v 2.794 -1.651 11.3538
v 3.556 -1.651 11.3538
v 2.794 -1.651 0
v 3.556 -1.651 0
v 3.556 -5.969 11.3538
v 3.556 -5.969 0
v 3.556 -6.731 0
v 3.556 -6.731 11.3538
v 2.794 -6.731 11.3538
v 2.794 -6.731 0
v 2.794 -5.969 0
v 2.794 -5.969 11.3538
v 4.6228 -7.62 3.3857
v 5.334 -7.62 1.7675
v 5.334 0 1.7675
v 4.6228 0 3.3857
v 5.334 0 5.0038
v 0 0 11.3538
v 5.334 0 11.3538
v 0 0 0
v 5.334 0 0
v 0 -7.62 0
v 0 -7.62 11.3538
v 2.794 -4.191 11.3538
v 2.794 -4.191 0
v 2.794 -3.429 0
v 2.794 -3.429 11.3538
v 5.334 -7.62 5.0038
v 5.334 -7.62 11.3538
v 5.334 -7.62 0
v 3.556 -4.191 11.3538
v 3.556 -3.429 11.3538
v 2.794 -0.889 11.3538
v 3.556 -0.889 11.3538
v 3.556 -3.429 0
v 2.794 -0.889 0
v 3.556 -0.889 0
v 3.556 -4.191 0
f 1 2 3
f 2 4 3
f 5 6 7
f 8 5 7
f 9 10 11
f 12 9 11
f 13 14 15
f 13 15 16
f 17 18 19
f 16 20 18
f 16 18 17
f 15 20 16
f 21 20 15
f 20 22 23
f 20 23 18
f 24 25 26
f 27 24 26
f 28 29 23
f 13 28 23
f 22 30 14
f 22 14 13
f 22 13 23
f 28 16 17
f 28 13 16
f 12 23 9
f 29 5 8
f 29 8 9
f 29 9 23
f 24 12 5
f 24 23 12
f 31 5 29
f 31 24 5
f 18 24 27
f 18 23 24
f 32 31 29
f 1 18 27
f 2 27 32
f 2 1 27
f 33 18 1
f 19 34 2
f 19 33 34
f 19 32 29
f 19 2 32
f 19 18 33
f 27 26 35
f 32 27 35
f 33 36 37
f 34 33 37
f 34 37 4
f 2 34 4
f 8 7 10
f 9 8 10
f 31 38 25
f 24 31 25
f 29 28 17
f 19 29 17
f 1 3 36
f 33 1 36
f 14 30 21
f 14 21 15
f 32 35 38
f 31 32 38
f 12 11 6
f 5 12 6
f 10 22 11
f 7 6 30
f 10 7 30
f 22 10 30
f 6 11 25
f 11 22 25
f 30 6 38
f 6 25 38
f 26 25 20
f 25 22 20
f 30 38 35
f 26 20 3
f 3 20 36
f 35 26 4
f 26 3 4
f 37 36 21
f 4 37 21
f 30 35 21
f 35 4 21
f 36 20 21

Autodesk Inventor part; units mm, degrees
ref_plane "YZ Plane" through (0, 0, 0) normal (1, 0, 0) x (0, 1, 0)
ref_plane "XZ Plane" through (0, 0, 0) normal (0, 1, 0) x (-1, 0, 0)
ref_plane "XY Plane" through (0, 0, 0) normal (0, 0, 1) x (1, 0, 0)
sketch "Sketch1" plane through (0, 0, 0) normal (0, 0, 1) x (1, 0, 0)
  line L0 (2.794, -4.191) -> (2.794, -3.429)
  line L1 (2.794, -3.429) -> (3.556, -3.429)
  line L2 (3.556, -3.429) -> (3.556, -4.191)
  line L3 (3.556, -4.191) -> (2.794, -4.191)
  line L4 (2.794, -6.731) -> (2.794, -5.969)
  line L5 (2.794, -5.969) -> (3.556, -5.969)
  line L6 (3.556, -5.969) -> (3.556, -6.731)
  line L7 (3.556, -6.731) -> (2.794, -6.731)
  line L8 (2.794, -1.651) -> (2.794, -0.889)
  line L9 (2.794, -0.889) -> (3.556, -0.889)
  line L10 (3.556, -0.889) -> (3.556, -1.651)
  line L11 (3.556, -1.651) -> (2.794, -1.651)
  line L12 (5.334, 0) -> (5.334, -7.62)
  line L13 (5.334, 0) -> (0, 0)
  line L14 (0, 0) -> (0, -7.62)
  line L15 (0, -7.62) -> (5.334, -7.62)
  line L16 (5.334, -7.62) -> (6.35, -7.62)
  line L17 (6.35, 0) -> (6.35, -7.62)
  line L18 (6.35, 0) -> (5.334, 0)
  line L19 (-0.611, -8.231) -> (-0.611, 0.611)
  line L20 (-0.611, 0.611) -> (5.334, 0.611)
  line L21 (5.334, 0.611) -> (6.961, 0.611)
  line L22 (6.961, 0.611) -> (6.961, -8.231)
  line L23 (6.961, -8.231) -> (5.334, -8.231)
  line L24 (5.334, -8.231) -> (-0.611, -8.231)
  point P0 (-0.635, 26.67)
  dimension "d2" = 0.611
extrude "Extrusion1" add sketch "Sketch1" along normal blind 5.0038 contours L18 L17 L16 L12 | L12 L15 L14 L13
sketch "Sketch2" plane through (0, -7.62, 0) normal (0, -1, 0) x (1, 0, 0)
  point P0 (-0.635, -6.0808)
sketch "Sketch3" plane through (0, -7.62, 0) normal (0, -1, 0) x (1, 0, 0)
  line L0 (6.35, 5.0038) -> (6.35, 0)
  line L1 (5.334, 5.0038) -> (6.35, 5.0038)
  line L2 (4.6228, 3.3857) -> (5.334, 5.0038)
  line L3 (5.334, 1.7675) -> (4.6228, 3.3857)
  line L4 (5.334, 0) -> (5.334, 1.7675)
  line L5 (0, 0) -> (5.334, 0)
  line L6 (5.334, 0) -> (6.35, 0)
  point P0 (-0.635, -6.0808)
extrude "Extrusion2" cut sketch "Sketch3" against normal blind 25.4
ref_plane "Work Plane5" through (0, 0, 8.1788) normal (0, 0, 1) x (1, 0, 0)
ref_plane "Work Plane7" through (0, 0, 11.3538) normal (0, 0, 1) x (1, 0, 0)
ref_plane "Work Plane9" through (0, 0, 8.1788) normal (0, 0, 1) x (1, 0, 0)
ref_plane "Work Plane10" through (0, 0, 11.3538) normal (0, 0, 1) x (1, 0, 0)
ref_plane "Work Plane11" through (0, 0, 8.1788) normal (0, 0, 1) x (1, 0, 0)
ref_plane "Work Plane12" through (0, 0, 11.3538) normal (0, 0, 1) x (1, 0, 0)
sketch "Sketch4" plane through (0, 0, 5.0038) normal (0, 0, 1) x (1, 0, 0)
  line L0 (5.334, -7.62) -> (5.334, 0) projected
  line L1 (0, 0) -> (5.334, 0) projected
  line L2 (0, -7.62) -> (0, 0) projected
  line L3 (5.334, -7.62) -> (0, -7.62) projected
  line L4 (2.794, -3.429) -> (3.556, -3.429) projected
  line L5 (3.556, -3.429) -> (3.556, -4.191) projected
  line L6 (3.556, -4.191) -> (2.794, -4.191) projected
  line L7 (2.794, -4.191) -> (2.794, -3.429) projected
  line L8 (2.794, -5.969) -> (3.556, -5.969) projected
  line L9 (3.556, -5.969) -> (3.556, -6.731) projected
  line L10 (3.556, -6.731) -> (2.794, -6.731) projected
  line L11 (2.794, -6.731) -> (2.794, -5.969) projected
  line L12 (2.794, -0.889) -> (3.556, -0.889) projected
  line L13 (3.556, -0.889) -> (3.556, -1.651) projected
  line L14 (3.556, -1.651) -> (2.794, -1.651) projected
  line L15 (2.794, -1.651) -> (2.794, -0.889) projected
extrude "Extrusion3" add sketch "Sketch4" along normal blind 6.35
ref_plane "Work Plane6" through (0, 0, 8.1788) normal (0, 0, 1) x (1, 0, 0)
ref_plane "Work Plane8" through (0, 0, 11.3538) normal (0, 0, 1) x (1, 0, 0)
properties part number "pwm connector"
